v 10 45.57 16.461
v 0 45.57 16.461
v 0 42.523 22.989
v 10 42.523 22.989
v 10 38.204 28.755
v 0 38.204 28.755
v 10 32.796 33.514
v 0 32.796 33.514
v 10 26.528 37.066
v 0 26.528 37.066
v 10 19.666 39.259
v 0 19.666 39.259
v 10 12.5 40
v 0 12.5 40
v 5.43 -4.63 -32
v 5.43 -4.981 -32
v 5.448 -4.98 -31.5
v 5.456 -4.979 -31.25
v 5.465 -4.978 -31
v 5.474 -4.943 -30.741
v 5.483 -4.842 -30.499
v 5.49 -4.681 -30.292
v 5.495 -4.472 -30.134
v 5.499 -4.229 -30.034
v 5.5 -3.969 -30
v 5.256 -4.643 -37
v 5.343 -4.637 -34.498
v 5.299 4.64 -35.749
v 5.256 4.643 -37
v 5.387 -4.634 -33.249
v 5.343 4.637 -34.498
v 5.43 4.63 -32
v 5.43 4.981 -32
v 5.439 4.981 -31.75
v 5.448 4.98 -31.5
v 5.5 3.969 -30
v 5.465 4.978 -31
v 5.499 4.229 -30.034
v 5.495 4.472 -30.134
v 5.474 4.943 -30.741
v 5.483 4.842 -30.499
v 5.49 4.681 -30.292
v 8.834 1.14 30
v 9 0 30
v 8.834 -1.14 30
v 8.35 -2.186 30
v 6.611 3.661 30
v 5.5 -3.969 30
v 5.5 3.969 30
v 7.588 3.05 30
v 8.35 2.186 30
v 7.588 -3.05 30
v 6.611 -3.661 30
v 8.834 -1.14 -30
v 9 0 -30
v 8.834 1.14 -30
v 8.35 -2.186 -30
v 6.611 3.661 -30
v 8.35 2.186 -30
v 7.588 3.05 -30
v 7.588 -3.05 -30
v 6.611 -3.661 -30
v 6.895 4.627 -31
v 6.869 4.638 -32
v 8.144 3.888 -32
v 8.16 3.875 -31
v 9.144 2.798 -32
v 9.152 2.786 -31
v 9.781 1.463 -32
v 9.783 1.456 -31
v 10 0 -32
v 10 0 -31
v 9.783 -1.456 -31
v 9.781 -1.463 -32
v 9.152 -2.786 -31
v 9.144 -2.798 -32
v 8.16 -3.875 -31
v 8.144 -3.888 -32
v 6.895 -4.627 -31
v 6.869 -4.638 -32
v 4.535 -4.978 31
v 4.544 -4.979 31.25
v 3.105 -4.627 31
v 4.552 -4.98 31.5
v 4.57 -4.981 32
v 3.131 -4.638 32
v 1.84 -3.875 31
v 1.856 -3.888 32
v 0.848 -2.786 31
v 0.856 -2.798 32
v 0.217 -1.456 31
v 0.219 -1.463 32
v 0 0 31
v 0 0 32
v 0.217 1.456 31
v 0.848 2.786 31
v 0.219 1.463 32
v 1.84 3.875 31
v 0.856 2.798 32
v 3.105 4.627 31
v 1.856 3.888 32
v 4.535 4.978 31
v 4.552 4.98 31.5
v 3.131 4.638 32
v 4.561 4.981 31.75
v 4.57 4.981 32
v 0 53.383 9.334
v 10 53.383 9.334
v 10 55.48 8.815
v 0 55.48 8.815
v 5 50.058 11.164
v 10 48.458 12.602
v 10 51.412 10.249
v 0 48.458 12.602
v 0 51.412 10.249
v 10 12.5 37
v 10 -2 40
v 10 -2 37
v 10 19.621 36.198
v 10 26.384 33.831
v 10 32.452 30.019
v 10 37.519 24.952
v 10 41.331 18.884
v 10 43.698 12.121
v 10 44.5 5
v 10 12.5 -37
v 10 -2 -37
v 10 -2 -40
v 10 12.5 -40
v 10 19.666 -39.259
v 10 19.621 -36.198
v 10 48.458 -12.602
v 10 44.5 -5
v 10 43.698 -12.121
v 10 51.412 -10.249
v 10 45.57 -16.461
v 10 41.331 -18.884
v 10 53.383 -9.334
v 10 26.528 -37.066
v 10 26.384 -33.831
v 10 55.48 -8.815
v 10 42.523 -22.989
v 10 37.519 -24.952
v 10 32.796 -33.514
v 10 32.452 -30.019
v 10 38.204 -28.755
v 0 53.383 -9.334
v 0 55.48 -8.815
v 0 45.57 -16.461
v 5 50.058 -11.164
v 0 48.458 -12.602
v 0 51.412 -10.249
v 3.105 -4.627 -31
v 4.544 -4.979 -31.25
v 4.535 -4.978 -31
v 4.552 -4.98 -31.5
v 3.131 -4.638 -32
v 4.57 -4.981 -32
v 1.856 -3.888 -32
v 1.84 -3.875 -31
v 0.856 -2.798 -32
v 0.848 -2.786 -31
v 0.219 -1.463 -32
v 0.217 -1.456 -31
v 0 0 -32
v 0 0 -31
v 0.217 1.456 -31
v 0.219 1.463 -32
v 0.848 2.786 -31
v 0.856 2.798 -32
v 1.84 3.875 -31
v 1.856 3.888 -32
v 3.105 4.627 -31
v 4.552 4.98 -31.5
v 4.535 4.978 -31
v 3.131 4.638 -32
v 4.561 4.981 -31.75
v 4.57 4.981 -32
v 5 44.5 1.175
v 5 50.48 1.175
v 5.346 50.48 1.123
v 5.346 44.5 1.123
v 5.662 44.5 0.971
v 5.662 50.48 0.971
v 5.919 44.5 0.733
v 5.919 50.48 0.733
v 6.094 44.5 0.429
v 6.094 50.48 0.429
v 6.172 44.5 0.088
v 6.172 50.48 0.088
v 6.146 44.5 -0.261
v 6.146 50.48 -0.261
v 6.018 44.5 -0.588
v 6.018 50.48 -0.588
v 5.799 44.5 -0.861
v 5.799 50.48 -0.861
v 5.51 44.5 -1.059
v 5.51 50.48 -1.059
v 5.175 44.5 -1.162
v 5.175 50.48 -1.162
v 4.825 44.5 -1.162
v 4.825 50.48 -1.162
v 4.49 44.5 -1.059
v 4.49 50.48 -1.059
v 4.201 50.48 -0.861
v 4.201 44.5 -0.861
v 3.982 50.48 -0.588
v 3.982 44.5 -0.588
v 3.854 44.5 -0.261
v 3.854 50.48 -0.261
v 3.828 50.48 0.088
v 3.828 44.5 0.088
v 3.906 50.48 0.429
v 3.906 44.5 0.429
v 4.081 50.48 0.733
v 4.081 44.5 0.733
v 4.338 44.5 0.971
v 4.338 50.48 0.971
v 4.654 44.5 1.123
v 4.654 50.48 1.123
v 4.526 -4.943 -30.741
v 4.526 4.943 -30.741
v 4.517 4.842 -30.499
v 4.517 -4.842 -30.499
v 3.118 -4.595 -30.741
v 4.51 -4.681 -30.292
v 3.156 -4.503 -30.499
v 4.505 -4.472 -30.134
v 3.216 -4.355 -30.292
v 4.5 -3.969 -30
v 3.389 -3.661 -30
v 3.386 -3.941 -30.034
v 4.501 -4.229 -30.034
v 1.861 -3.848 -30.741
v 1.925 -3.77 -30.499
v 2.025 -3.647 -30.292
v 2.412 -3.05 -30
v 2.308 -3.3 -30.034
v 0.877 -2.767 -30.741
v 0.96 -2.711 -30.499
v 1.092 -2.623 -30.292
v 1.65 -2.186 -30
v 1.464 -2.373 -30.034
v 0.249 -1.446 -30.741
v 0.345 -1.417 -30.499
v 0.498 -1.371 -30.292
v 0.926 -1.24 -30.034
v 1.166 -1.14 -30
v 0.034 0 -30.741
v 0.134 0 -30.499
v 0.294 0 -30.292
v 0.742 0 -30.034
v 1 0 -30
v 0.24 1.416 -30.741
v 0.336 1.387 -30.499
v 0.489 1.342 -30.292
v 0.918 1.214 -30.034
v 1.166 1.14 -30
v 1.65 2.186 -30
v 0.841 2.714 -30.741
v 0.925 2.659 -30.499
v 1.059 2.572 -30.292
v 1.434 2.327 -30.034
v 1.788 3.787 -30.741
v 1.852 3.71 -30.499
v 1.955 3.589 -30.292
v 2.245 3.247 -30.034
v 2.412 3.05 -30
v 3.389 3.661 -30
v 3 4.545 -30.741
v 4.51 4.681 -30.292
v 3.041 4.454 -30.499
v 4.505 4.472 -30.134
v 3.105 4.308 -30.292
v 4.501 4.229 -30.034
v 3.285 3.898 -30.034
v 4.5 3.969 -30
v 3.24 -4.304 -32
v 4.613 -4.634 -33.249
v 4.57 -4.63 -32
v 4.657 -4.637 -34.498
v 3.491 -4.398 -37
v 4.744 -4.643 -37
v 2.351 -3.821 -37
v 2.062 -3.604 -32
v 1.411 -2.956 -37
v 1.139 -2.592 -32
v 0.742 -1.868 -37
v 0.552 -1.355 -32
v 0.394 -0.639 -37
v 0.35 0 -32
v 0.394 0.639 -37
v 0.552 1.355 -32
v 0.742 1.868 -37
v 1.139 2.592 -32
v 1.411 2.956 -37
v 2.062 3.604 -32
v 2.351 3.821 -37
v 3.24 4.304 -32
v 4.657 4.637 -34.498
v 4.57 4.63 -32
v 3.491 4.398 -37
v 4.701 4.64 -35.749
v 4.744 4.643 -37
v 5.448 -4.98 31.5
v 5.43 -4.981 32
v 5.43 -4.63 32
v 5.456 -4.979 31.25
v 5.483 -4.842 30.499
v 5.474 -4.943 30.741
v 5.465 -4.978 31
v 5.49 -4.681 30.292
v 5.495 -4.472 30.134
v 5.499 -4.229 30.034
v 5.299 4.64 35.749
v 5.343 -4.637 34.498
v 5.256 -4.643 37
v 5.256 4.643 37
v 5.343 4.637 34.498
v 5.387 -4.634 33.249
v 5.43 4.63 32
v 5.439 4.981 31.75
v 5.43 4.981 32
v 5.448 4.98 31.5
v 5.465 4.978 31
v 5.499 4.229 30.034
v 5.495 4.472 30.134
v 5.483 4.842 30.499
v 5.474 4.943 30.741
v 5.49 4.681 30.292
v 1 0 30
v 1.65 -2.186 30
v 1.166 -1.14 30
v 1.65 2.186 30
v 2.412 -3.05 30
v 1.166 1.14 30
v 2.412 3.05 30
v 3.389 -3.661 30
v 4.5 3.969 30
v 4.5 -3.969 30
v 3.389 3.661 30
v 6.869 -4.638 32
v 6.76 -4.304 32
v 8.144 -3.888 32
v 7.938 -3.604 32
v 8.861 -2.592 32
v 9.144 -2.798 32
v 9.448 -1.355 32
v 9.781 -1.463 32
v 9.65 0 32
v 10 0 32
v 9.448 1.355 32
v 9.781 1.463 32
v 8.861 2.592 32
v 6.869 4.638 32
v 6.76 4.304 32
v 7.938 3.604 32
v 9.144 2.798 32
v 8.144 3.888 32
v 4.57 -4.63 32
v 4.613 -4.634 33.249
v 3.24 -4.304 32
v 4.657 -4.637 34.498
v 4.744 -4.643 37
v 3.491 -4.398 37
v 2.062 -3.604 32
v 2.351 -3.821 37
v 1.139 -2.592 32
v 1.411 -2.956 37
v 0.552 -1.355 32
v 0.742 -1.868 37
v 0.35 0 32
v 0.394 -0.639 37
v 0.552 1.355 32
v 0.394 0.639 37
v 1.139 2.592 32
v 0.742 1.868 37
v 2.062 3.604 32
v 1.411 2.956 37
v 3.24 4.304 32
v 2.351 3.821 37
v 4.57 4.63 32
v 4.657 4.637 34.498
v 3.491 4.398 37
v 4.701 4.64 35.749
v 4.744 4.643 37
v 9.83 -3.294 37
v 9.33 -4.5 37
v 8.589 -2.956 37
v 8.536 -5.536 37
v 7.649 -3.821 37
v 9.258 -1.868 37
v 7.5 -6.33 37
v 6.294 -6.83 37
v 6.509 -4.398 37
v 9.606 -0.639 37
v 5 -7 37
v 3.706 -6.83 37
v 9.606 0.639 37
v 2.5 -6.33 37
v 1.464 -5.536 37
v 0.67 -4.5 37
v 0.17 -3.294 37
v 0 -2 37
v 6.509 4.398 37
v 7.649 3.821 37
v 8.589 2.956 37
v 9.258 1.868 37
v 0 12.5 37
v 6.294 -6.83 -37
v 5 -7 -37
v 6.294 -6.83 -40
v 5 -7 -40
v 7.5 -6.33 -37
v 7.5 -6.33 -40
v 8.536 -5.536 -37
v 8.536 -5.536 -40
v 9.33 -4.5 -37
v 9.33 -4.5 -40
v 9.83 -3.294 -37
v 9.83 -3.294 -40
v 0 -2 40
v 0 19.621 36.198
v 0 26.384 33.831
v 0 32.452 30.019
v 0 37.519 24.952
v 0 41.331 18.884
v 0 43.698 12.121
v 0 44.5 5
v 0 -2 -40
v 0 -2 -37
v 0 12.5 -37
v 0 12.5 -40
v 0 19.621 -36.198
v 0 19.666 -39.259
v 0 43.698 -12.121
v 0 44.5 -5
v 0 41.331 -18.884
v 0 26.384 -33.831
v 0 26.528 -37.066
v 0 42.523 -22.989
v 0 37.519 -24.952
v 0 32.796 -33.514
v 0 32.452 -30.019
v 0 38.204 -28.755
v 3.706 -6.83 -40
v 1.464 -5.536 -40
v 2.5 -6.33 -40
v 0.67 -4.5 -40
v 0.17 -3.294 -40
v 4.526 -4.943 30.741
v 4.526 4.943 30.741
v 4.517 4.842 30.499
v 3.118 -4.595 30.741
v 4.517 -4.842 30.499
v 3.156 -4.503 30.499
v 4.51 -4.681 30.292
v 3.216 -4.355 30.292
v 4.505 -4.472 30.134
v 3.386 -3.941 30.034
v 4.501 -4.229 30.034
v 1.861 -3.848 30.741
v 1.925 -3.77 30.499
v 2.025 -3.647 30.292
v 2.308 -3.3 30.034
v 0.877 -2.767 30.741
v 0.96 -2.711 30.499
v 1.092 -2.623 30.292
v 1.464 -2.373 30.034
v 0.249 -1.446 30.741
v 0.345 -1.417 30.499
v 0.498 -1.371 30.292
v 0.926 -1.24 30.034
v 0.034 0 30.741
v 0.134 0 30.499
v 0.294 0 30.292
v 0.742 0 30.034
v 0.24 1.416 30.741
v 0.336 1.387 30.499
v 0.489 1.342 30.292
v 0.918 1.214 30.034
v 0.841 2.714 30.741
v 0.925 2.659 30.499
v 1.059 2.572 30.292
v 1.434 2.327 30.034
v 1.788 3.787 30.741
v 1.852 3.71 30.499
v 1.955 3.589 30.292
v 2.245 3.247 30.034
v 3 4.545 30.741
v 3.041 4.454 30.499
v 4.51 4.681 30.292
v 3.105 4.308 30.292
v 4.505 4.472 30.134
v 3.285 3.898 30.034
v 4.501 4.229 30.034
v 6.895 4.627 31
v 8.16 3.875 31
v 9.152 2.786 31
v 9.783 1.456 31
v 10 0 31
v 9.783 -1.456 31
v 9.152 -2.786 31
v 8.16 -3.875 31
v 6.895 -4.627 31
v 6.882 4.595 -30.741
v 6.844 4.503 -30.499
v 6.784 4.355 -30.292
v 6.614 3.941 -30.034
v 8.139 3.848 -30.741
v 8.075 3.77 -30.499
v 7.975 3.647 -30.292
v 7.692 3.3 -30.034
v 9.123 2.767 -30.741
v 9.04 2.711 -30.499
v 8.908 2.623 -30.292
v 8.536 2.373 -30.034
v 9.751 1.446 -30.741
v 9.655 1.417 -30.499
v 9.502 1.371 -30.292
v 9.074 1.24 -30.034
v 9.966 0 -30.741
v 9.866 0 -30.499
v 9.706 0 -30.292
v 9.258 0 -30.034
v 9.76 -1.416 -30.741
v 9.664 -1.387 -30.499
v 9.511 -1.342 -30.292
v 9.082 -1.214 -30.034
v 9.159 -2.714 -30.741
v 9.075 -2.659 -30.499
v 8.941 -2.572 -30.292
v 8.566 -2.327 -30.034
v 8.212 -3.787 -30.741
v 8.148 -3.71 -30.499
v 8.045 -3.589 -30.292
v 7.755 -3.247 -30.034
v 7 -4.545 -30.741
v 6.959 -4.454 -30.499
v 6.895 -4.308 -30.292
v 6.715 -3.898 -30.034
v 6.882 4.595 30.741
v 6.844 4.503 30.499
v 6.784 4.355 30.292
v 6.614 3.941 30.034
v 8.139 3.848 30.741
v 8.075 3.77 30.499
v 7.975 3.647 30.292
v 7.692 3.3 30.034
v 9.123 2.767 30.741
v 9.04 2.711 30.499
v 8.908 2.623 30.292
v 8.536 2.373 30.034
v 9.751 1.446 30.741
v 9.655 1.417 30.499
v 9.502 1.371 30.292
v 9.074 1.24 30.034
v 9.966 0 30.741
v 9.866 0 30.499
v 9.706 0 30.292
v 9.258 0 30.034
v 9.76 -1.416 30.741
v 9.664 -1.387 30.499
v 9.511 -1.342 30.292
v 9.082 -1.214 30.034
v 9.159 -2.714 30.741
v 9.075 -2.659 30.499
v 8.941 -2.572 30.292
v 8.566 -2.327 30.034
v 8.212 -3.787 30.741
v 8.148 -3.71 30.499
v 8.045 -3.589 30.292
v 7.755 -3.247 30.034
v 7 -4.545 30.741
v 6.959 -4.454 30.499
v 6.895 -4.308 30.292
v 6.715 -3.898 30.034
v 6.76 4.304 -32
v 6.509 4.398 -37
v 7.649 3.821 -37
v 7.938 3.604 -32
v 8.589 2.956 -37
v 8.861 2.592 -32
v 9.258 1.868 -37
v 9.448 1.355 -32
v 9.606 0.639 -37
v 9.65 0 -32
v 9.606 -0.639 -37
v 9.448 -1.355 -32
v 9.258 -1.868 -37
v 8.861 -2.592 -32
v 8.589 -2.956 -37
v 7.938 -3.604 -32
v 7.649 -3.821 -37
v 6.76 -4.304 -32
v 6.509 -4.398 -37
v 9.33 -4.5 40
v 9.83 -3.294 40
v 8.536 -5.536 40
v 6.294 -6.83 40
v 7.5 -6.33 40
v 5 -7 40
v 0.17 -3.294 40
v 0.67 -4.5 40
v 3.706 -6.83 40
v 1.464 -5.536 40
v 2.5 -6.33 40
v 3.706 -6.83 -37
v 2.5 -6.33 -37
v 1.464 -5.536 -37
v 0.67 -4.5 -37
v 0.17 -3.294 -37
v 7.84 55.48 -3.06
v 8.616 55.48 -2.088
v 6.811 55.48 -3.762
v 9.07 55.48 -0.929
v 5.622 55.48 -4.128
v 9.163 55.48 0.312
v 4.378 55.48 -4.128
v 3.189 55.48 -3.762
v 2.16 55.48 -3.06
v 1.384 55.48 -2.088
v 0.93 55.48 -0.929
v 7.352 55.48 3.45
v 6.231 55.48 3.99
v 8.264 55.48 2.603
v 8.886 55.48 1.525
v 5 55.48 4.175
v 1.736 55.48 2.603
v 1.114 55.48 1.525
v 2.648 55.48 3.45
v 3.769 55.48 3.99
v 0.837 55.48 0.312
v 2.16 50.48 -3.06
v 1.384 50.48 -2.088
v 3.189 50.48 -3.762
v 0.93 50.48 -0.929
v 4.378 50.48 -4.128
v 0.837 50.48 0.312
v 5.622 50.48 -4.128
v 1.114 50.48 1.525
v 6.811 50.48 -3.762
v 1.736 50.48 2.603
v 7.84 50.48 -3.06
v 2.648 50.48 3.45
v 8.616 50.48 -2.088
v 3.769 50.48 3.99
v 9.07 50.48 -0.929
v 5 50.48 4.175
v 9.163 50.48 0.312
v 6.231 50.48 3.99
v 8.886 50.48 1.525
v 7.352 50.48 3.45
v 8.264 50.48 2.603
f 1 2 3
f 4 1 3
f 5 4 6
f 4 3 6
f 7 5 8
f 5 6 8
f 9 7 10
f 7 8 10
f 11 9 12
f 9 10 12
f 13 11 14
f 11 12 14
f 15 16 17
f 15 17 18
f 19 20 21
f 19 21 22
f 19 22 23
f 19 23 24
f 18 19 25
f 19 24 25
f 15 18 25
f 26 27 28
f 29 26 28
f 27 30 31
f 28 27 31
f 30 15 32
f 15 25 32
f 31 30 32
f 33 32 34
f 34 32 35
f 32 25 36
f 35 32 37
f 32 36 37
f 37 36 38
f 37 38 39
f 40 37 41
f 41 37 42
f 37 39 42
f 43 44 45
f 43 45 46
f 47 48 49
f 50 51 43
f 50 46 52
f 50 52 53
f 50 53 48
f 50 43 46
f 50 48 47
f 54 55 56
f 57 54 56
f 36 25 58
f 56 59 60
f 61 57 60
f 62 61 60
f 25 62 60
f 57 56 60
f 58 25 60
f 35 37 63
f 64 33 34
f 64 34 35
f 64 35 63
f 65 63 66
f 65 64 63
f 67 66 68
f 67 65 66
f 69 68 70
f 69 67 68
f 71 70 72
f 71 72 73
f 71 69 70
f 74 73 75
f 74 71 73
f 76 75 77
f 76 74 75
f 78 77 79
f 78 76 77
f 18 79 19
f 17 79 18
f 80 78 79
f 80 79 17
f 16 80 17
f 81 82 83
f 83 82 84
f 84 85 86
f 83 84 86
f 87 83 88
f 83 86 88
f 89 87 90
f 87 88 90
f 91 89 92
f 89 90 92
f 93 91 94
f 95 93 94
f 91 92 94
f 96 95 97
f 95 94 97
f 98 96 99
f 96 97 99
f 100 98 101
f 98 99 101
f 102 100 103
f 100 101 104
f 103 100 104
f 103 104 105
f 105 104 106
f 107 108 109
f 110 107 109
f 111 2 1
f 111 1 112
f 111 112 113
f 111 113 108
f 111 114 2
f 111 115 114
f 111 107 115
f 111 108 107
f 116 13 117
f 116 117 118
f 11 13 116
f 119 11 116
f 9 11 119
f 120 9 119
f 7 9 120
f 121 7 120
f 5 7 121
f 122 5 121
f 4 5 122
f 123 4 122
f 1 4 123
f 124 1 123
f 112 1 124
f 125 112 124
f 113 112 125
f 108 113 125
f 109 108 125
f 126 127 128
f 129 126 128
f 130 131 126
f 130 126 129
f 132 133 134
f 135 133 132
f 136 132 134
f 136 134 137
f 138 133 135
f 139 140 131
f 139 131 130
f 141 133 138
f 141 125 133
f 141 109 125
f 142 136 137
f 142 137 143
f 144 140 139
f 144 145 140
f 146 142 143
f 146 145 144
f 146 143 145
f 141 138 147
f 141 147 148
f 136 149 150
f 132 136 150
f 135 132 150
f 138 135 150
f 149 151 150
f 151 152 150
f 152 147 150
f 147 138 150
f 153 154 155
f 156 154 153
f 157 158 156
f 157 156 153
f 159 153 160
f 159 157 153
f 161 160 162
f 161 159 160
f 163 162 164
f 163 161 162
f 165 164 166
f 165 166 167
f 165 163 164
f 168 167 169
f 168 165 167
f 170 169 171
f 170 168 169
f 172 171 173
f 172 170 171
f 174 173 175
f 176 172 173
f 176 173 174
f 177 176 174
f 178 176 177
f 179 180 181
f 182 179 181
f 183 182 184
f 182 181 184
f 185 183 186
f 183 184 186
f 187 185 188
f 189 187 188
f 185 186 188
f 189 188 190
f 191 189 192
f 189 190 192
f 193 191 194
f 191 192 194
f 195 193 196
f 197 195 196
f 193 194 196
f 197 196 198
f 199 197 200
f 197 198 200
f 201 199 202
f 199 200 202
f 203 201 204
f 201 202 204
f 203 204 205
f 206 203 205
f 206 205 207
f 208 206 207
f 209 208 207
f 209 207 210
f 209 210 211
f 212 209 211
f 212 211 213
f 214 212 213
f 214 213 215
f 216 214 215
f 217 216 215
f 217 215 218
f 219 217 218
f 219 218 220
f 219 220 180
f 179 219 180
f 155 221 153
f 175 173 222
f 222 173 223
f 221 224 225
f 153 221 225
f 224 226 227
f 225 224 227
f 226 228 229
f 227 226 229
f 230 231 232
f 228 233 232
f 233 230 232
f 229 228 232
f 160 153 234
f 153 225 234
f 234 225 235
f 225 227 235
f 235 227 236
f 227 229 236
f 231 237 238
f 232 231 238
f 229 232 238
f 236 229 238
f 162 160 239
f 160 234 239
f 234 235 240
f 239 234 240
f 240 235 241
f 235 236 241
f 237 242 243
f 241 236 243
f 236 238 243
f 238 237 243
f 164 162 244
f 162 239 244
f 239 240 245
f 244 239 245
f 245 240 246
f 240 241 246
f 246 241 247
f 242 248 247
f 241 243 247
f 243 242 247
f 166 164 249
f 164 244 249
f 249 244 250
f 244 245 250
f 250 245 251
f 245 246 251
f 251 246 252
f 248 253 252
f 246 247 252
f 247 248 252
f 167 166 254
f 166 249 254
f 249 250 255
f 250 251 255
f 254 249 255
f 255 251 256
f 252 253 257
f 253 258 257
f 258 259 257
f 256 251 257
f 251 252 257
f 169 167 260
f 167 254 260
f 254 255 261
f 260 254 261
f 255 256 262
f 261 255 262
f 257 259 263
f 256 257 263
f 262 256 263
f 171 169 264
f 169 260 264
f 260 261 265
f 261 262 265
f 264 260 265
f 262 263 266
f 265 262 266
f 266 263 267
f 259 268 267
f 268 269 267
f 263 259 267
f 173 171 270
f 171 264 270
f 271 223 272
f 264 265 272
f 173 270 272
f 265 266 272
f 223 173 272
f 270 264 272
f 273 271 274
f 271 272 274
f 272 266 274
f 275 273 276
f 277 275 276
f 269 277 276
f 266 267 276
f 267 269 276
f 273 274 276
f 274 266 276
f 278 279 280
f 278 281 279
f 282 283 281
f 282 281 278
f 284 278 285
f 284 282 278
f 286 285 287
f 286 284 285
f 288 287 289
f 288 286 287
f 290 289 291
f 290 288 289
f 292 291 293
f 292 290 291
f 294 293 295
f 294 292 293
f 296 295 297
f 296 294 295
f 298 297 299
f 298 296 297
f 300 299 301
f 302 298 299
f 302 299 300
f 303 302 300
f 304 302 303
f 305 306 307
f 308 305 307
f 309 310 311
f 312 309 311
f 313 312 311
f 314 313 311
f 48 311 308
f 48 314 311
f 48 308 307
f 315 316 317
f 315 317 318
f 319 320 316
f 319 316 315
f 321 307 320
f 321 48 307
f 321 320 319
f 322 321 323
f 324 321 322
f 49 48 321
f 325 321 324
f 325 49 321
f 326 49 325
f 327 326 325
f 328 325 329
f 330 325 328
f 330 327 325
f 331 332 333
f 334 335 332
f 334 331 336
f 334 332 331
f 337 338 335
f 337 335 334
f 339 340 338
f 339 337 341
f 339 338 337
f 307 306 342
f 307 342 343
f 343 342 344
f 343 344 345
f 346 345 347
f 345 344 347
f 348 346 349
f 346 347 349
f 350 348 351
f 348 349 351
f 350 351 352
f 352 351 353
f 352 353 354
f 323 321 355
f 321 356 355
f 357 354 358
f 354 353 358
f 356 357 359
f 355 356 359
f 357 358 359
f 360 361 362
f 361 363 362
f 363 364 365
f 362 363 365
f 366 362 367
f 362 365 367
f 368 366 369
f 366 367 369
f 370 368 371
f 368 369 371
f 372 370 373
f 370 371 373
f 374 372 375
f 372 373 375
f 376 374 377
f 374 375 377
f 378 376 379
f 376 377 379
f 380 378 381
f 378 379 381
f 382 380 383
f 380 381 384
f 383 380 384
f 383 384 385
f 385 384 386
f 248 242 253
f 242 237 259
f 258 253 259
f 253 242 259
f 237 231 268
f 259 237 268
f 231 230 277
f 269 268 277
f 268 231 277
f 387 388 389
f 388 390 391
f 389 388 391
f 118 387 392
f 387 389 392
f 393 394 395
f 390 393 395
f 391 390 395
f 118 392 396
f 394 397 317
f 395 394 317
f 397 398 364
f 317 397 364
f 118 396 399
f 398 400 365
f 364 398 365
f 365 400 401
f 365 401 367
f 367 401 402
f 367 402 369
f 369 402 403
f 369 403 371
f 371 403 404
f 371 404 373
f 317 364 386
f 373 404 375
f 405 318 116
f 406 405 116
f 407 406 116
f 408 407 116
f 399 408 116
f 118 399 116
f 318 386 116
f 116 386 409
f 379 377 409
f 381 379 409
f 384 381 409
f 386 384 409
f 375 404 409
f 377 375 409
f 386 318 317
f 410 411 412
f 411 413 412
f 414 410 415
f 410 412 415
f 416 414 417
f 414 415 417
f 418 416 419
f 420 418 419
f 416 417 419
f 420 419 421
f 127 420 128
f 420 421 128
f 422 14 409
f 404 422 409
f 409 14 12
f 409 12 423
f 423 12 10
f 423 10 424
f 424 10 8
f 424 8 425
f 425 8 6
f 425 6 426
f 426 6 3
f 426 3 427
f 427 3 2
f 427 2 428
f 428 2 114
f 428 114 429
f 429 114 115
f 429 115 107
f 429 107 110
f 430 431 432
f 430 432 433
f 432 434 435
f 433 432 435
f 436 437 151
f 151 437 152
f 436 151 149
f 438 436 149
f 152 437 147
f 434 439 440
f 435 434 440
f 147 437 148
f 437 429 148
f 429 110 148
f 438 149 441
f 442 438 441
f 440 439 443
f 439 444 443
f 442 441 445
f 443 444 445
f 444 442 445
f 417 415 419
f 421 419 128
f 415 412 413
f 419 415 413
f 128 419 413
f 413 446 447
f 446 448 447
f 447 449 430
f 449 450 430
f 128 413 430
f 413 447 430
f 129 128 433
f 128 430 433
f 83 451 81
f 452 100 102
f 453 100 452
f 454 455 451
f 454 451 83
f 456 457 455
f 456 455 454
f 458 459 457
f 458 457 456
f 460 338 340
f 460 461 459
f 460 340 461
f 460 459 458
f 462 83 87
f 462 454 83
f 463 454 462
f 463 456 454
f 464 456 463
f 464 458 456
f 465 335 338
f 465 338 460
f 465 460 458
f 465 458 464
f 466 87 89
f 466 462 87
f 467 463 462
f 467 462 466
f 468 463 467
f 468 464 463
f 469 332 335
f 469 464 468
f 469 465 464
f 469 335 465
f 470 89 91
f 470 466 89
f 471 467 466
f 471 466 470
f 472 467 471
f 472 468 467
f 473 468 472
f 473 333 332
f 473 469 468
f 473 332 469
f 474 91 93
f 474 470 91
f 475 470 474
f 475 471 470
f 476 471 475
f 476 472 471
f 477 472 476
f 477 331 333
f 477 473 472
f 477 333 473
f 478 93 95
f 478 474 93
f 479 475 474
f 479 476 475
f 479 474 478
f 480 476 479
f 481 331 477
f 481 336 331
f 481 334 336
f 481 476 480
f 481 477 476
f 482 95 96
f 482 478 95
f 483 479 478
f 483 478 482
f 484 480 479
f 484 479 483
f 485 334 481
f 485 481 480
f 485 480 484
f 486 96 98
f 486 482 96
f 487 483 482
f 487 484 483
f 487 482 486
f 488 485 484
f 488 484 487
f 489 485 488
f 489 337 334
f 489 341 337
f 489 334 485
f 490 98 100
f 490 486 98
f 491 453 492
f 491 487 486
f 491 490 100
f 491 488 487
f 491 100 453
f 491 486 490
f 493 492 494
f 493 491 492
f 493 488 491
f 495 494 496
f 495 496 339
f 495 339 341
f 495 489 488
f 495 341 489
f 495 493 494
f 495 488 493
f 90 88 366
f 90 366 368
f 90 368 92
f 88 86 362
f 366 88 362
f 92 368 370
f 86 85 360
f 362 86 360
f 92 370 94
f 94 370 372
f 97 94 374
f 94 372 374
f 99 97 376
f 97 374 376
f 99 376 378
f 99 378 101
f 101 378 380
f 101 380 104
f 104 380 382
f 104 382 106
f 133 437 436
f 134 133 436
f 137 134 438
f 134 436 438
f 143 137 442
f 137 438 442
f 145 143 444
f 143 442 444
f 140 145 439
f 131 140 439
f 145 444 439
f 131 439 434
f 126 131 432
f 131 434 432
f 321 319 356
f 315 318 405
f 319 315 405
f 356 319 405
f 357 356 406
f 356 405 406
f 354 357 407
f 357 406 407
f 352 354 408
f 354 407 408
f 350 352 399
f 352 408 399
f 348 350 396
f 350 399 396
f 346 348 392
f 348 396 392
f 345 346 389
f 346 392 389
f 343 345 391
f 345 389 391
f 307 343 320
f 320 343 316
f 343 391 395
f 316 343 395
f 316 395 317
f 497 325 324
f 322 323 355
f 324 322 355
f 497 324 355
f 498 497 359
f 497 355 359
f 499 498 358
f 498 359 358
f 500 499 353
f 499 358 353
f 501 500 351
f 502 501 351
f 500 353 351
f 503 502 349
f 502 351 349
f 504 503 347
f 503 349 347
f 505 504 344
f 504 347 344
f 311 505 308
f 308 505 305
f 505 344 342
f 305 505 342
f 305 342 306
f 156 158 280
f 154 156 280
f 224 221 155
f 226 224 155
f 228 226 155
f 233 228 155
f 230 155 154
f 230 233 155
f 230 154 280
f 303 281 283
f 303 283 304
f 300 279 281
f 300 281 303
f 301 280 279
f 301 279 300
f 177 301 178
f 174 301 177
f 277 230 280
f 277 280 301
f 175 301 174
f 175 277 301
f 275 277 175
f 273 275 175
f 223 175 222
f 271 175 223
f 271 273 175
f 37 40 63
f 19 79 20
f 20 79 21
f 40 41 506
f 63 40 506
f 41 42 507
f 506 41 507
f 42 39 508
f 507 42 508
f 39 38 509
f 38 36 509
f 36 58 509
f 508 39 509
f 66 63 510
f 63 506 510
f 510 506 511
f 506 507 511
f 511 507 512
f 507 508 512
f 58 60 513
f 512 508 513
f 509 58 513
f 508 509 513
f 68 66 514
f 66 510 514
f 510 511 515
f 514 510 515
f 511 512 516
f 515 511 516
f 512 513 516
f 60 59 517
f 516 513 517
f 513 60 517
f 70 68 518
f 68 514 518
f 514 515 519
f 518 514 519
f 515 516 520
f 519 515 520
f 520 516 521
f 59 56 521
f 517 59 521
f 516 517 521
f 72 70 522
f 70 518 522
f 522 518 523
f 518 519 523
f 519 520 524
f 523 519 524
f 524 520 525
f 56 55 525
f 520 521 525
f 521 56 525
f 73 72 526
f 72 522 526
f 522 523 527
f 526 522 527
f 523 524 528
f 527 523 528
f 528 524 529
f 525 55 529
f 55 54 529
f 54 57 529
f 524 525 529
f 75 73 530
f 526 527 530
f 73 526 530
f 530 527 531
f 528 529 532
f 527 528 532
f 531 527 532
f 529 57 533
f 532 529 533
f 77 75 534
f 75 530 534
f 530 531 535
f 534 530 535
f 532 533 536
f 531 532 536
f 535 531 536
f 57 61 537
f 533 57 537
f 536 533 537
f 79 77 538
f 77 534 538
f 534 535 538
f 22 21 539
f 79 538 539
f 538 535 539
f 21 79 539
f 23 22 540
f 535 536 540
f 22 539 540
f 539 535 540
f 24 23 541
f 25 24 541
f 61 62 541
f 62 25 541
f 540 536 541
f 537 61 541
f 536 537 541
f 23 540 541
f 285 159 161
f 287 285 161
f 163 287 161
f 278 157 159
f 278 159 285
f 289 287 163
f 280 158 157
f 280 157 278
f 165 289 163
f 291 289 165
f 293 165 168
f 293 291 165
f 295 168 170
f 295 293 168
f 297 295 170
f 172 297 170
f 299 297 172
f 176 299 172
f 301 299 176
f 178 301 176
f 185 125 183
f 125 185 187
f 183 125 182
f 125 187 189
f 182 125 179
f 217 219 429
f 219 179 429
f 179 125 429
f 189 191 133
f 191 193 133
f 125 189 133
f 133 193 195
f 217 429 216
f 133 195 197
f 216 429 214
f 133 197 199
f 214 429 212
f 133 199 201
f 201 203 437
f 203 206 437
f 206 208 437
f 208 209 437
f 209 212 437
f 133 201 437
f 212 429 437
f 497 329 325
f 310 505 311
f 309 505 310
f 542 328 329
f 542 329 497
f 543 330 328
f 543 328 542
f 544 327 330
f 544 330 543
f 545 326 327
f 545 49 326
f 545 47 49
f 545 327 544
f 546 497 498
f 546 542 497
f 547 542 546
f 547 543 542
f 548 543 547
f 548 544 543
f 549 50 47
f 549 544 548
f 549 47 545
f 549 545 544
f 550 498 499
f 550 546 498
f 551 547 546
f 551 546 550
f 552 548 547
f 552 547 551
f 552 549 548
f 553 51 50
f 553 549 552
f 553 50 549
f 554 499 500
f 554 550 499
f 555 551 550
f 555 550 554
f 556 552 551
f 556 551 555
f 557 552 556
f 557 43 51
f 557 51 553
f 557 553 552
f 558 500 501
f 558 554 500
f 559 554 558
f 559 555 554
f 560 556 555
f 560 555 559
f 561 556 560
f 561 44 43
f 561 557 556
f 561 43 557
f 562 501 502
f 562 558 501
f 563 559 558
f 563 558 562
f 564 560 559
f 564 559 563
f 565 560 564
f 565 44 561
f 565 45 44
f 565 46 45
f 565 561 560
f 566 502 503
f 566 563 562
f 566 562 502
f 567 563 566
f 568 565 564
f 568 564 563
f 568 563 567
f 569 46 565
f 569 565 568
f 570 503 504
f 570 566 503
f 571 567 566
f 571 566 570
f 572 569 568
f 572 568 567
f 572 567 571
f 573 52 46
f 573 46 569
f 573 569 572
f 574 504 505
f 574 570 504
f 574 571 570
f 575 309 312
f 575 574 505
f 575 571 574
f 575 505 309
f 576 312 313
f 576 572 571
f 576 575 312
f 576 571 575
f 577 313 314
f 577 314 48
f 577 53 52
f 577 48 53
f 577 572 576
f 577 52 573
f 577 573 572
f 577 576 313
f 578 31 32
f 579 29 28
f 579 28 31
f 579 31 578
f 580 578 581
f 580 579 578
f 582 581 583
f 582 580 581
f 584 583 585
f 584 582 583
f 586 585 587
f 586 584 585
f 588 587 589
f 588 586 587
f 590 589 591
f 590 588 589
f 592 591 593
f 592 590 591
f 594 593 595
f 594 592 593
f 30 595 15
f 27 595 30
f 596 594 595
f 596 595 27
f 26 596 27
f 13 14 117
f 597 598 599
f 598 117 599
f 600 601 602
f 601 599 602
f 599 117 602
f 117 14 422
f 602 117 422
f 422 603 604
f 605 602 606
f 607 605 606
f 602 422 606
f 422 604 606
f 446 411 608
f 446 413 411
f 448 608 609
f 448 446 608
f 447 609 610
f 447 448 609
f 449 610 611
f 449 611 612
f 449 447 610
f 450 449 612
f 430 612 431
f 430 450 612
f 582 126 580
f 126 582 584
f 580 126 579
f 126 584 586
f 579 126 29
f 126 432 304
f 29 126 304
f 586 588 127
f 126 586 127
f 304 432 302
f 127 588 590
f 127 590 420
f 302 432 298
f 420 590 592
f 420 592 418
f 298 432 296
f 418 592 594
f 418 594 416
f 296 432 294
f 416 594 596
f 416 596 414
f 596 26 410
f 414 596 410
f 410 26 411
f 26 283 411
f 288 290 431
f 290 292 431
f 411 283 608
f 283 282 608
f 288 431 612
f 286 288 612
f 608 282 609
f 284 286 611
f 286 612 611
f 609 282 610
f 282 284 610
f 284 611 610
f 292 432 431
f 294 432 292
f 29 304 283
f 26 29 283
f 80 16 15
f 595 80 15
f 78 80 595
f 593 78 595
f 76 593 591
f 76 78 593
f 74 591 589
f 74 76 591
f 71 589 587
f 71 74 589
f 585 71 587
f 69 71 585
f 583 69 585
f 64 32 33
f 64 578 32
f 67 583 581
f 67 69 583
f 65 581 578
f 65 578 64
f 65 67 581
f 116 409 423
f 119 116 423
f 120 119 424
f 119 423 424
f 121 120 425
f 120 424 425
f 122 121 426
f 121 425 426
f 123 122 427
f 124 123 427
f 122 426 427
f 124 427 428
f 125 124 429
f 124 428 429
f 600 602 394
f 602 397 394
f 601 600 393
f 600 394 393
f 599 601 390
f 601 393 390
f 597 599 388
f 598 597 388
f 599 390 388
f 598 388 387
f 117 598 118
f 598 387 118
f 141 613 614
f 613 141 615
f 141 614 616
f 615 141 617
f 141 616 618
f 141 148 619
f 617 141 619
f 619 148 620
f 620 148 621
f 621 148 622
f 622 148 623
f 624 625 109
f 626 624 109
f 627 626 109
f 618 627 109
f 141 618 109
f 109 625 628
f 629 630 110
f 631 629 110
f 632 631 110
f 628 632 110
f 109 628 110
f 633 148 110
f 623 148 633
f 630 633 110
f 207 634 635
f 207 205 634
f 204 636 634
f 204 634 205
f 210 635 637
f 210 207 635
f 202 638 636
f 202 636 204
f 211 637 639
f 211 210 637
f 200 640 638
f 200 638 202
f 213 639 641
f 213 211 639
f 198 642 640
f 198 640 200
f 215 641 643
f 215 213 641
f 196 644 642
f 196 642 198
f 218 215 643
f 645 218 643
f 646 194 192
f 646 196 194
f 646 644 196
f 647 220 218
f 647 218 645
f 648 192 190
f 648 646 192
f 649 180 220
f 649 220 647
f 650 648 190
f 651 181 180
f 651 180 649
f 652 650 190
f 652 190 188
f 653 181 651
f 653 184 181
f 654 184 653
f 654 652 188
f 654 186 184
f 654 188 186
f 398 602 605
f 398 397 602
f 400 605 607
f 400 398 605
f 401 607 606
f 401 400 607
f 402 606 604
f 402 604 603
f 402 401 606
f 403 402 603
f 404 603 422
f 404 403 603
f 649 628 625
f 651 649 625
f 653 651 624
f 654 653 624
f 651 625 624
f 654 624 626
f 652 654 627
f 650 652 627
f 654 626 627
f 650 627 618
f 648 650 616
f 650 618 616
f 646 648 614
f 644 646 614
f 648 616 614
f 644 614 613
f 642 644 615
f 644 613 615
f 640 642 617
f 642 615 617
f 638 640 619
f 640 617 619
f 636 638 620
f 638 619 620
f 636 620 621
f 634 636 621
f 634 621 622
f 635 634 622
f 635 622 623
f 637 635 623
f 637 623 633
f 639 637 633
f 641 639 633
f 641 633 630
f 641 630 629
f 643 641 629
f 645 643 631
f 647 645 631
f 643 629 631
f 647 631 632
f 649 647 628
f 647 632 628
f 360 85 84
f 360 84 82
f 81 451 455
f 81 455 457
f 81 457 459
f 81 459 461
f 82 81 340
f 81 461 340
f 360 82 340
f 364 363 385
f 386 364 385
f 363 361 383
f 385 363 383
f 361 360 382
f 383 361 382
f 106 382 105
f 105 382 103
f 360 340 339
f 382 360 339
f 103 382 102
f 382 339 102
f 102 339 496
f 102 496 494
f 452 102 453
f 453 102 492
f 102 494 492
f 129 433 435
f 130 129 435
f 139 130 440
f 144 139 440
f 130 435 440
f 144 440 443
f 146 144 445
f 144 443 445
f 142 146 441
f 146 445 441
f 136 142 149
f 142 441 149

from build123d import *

# Parameters (mm, degrees)
BOSS_EXTRUDE1_DEPTH  = 10
FILLET1_R            = 5
SKETCH6_R            = 4.65
BOSS_EXTRUDE2_DEPTH  = 5
SKETCH7_R            = 5
BOSS_EXTRUDE3_DEPTH  = 2
FILLET2_R            = 1
FILLET2_OF_MIRROR1_R = 1
BOSS_EXTRUDE4_START  = -10
BOSS_EXTRUDE4_DEPTH  = 10
SKETCH9_R            = 4.175
CUT_EXTRUDE1_DEPTH   = 5
SKETCH10_R           = 1.175
CUT_EXTRUDE2_DEPTH   = 71.738227722
SKETCH12_W           = 1
SKETCH12_H           = 12
CUT_EXTRUDE3_DEPTH   = 7
CUT_EXTRUDE3_DRAFT   = -2
SKETCH13_W           = 1
SKETCH13_H           = 12
CUT_EXTRUDE4_DEPTH   = 7
CUT_EXTRUDE4_DRAFT   = -2


with BuildPart() as part:
    # Sketch3 → Boss-Extrude1 (new body)
    with BuildSketch(Plane(origin=(0, 0, 0), x_dir=(0, 0, -1), z_dir=(1, 0, 0))):
        with BuildLine():
            Line((-37, -7), (-37, 12.5))
            ThreePointArc((-37, 12.5), (-27.627416998, 35.127416998), (-5, 44.5))
            Line((-5, 44.5), (5, 44.5))
            ThreePointArc((5, 44.5), (27.627416998, 35.127416998), (37, 12.5))
            Line((37, 12.5), (37, -7))
            Line((37, -7), (40, -7))
            Line((40, -7), (40, 12.5))
            ThreePointArc((40, 12.5), (29.748737342, 37.248737342), (5, 47.5))
            Line((5, 47.5), (-5, 47.5))
            ThreePointArc((-5, 47.5), (-29.748737342, 37.248737342), (-40, 12.5))
            Line((-40, 12.5), (-40, -7))
            Line((-40, -7), (-37, -7))
        make_face()
    extrude(amount=BOSS_EXTRUDE1_DEPTH)

    # Fillet1
    fillet1_edges = [part.edges().sort_by_distance(p)[0] for p in [
        (10, -7, -38.5),
        (0, -7, -38.5),
        (0, -7, 38.5),
        (10, -7, 38.5),
    ]]
    fillet(fillet1_edges, radius=FILLET1_R - 0.0001)  # a hair under: the kernel refuses the full size

    # Sketch6 → Boss-Extrude2 (add)
    with BuildSketch(Plane(origin=(0, 0, 37), x_dir=(-1, 0, 0), z_dir=(0, 0, -1))):
        with Locations(Location((-5, 0, 0), (0, 0, 270))):
            Circle(SKETCH6_R)
    boss_extrude2 = extrude(amount=BOSS_EXTRUDE2_DEPTH)

    # Sketch7 → Boss-Extrude3 (add)
    with BuildSketch(Plane(origin=(0, 0, 32), x_dir=(-1, 0, 0), z_dir=(0, 0, -1))):
        with Locations(Location((-5, 0, 0), (0, 0, 90))):
            Circle(SKETCH7_R)
    boss_extrude3 = extrude(amount=BOSS_EXTRUDE3_DEPTH)

    # Fillet2
    fillet2_edges = [part.edges().sort_by_distance(p)[0] for p in [
        (5, -5, 30),
    ]]
    fillet(fillet2_edges, radius=FILLET2_R)

    # Mirror1: Boss-Extrude2, Boss-Extrude3 across plane
    add(boss_extrude2.mirror(Plane.XY))
    add(boss_extrude3.mirror(Plane.XY))

    # Fillet2 of Mirror1
    fillet2_of_mirror1_edges = [part.edges().sort_by_distance(p)[0] for p in [
        (5, -5, -30),
    ]]
    fillet(fillet2_of_mirror1_edges, radius=FILLET2_OF_MIRROR1_R)

    # Sketch8 → Boss-Extrude4 (add)
    with BuildSketch(Plane(origin=(10, 0, 0), x_dir=(0, 0, -1), z_dir=(1, 0, 0)).offset(BOSS_EXTRUDE4_START)):
        with BuildLine():
            Line((8.815238473, 55.479534195), (-8.815238473, 55.479534195))
            add(Edge.make_bspline(
                [(-16.460806571, 45.570378177), (-9.68931269, 49.59059719), (-8.815238473, 55.479534195)],
                knots=[0, 0, 0, 1, 1, 1], degree=2))
            ThreePointArc((-16.460806571, 45.570378177), (-10.811056867, 47.014223417), (-5, 47.5))
            Line((-5, 47.5), (5, 47.5))
            ThreePointArc((5, 47.5), (10.811056867, 47.014223417), (16.460806571, 45.570378177))
            add(Edge.make_bspline(
                [(16.460806571, 45.570378177), (9.68931269, 49.59059719), (8.815238473, 55.479534195)],
                knots=[0, 0, 0, 1, 1, 1], degree=2))
        make_face()
    extrude(amount=BOSS_EXTRUDE4_DEPTH)

    # Sketch9 → Cut-Extrude1 (cut)
    with BuildSketch(Plane(origin=(0, 55.479534195, 0), x_dir=(1, 0, 0), z_dir=(0, 1, 0))):
        with Locations(Location((5, 0, 0), (0, 0, 270))):
            Circle(SKETCH9_R)
    extrude(amount=-CUT_EXTRUDE1_DEPTH, mode=Mode.SUBTRACT)

    # Sketch10 → Cut-Extrude2 (cut, through all)
    with BuildSketch(Plane(origin=(0, 50.479534195, 0), x_dir=(1, 0, 0), z_dir=(0, 1, 0))):
        with Locations(Location((5, 0, 0), (0, 0, 270))):
            Circle(SKETCH10_R)
    extrude(amount=-CUT_EXTRUDE2_DEPTH, mode=Mode.SUBTRACT)


with BuildPart() as cut_extrude3_tool:
    # Sketch12 → Cut-Extrude3 (with draft: the straight prism first)
    with BuildSketch(Plane(origin=(0, 0, 30), x_dir=(-1, 0, 0), z_dir=(0, 0, -1))):
        with Locations((-5, 0)):
            Rectangle(SKETCH12_W, SKETCH12_H)
    extrude(amount=-CUT_EXTRUDE3_DEPTH)
    # Cut-Extrude3: the draft: its side faces are tilted about the plane it starts from
    cut_extrude3_sides = [cut_extrude3_tool.faces().sort_by_distance(p)[0] for p in [
        (4.5, 0, 33.5),
        (5, 6, 33.5),
        (5.5, 0, 33.5),
        (5, -6, 33.5),
    ]]
    draft(cut_extrude3_sides, Plane(origin=(0, 0, 30), x_dir=(-1, 0, 0), z_dir=(0, 0, -1)), CUT_EXTRUDE3_DRAFT)


with BuildPart() as part_1:
    add(part.part)

    # Cut-Extrude3: cut by cut_extrude3_tool
    add(cut_extrude3_tool.part, mode=Mode.SUBTRACT)


with BuildPart() as cut_extrude4_tool:
    # Sketch13 → Cut-Extrude4 (with draft: the straight prism first)
    with BuildSketch(Plane.XY.offset(-30)):
        with Locations((5, 0)):
            Rectangle(SKETCH13_W, SKETCH13_H)
    extrude(amount=-CUT_EXTRUDE4_DEPTH)
    # Cut-Extrude4: the draft: its side faces are tilted about the plane it starts from
    cut_extrude4_sides = [cut_extrude4_tool.faces().sort_by_distance(p)[0] for p in [
        (5, -6, -33.5),
        (5.5, 0, -33.5),
        (5, 6, -33.5),
        (4.5, 0, -33.5),
    ]]
    draft(cut_extrude4_sides, Plane.XY.offset(-30), CUT_EXTRUDE4_DRAFT)


with BuildPart() as part_2:
    add(part_1.part)

    # Cut-Extrude4: cut by cut_extrude4_tool
    add(cut_extrude4_tool.part, mode=Mode.SUBTRACT)


solid = part_2.part
